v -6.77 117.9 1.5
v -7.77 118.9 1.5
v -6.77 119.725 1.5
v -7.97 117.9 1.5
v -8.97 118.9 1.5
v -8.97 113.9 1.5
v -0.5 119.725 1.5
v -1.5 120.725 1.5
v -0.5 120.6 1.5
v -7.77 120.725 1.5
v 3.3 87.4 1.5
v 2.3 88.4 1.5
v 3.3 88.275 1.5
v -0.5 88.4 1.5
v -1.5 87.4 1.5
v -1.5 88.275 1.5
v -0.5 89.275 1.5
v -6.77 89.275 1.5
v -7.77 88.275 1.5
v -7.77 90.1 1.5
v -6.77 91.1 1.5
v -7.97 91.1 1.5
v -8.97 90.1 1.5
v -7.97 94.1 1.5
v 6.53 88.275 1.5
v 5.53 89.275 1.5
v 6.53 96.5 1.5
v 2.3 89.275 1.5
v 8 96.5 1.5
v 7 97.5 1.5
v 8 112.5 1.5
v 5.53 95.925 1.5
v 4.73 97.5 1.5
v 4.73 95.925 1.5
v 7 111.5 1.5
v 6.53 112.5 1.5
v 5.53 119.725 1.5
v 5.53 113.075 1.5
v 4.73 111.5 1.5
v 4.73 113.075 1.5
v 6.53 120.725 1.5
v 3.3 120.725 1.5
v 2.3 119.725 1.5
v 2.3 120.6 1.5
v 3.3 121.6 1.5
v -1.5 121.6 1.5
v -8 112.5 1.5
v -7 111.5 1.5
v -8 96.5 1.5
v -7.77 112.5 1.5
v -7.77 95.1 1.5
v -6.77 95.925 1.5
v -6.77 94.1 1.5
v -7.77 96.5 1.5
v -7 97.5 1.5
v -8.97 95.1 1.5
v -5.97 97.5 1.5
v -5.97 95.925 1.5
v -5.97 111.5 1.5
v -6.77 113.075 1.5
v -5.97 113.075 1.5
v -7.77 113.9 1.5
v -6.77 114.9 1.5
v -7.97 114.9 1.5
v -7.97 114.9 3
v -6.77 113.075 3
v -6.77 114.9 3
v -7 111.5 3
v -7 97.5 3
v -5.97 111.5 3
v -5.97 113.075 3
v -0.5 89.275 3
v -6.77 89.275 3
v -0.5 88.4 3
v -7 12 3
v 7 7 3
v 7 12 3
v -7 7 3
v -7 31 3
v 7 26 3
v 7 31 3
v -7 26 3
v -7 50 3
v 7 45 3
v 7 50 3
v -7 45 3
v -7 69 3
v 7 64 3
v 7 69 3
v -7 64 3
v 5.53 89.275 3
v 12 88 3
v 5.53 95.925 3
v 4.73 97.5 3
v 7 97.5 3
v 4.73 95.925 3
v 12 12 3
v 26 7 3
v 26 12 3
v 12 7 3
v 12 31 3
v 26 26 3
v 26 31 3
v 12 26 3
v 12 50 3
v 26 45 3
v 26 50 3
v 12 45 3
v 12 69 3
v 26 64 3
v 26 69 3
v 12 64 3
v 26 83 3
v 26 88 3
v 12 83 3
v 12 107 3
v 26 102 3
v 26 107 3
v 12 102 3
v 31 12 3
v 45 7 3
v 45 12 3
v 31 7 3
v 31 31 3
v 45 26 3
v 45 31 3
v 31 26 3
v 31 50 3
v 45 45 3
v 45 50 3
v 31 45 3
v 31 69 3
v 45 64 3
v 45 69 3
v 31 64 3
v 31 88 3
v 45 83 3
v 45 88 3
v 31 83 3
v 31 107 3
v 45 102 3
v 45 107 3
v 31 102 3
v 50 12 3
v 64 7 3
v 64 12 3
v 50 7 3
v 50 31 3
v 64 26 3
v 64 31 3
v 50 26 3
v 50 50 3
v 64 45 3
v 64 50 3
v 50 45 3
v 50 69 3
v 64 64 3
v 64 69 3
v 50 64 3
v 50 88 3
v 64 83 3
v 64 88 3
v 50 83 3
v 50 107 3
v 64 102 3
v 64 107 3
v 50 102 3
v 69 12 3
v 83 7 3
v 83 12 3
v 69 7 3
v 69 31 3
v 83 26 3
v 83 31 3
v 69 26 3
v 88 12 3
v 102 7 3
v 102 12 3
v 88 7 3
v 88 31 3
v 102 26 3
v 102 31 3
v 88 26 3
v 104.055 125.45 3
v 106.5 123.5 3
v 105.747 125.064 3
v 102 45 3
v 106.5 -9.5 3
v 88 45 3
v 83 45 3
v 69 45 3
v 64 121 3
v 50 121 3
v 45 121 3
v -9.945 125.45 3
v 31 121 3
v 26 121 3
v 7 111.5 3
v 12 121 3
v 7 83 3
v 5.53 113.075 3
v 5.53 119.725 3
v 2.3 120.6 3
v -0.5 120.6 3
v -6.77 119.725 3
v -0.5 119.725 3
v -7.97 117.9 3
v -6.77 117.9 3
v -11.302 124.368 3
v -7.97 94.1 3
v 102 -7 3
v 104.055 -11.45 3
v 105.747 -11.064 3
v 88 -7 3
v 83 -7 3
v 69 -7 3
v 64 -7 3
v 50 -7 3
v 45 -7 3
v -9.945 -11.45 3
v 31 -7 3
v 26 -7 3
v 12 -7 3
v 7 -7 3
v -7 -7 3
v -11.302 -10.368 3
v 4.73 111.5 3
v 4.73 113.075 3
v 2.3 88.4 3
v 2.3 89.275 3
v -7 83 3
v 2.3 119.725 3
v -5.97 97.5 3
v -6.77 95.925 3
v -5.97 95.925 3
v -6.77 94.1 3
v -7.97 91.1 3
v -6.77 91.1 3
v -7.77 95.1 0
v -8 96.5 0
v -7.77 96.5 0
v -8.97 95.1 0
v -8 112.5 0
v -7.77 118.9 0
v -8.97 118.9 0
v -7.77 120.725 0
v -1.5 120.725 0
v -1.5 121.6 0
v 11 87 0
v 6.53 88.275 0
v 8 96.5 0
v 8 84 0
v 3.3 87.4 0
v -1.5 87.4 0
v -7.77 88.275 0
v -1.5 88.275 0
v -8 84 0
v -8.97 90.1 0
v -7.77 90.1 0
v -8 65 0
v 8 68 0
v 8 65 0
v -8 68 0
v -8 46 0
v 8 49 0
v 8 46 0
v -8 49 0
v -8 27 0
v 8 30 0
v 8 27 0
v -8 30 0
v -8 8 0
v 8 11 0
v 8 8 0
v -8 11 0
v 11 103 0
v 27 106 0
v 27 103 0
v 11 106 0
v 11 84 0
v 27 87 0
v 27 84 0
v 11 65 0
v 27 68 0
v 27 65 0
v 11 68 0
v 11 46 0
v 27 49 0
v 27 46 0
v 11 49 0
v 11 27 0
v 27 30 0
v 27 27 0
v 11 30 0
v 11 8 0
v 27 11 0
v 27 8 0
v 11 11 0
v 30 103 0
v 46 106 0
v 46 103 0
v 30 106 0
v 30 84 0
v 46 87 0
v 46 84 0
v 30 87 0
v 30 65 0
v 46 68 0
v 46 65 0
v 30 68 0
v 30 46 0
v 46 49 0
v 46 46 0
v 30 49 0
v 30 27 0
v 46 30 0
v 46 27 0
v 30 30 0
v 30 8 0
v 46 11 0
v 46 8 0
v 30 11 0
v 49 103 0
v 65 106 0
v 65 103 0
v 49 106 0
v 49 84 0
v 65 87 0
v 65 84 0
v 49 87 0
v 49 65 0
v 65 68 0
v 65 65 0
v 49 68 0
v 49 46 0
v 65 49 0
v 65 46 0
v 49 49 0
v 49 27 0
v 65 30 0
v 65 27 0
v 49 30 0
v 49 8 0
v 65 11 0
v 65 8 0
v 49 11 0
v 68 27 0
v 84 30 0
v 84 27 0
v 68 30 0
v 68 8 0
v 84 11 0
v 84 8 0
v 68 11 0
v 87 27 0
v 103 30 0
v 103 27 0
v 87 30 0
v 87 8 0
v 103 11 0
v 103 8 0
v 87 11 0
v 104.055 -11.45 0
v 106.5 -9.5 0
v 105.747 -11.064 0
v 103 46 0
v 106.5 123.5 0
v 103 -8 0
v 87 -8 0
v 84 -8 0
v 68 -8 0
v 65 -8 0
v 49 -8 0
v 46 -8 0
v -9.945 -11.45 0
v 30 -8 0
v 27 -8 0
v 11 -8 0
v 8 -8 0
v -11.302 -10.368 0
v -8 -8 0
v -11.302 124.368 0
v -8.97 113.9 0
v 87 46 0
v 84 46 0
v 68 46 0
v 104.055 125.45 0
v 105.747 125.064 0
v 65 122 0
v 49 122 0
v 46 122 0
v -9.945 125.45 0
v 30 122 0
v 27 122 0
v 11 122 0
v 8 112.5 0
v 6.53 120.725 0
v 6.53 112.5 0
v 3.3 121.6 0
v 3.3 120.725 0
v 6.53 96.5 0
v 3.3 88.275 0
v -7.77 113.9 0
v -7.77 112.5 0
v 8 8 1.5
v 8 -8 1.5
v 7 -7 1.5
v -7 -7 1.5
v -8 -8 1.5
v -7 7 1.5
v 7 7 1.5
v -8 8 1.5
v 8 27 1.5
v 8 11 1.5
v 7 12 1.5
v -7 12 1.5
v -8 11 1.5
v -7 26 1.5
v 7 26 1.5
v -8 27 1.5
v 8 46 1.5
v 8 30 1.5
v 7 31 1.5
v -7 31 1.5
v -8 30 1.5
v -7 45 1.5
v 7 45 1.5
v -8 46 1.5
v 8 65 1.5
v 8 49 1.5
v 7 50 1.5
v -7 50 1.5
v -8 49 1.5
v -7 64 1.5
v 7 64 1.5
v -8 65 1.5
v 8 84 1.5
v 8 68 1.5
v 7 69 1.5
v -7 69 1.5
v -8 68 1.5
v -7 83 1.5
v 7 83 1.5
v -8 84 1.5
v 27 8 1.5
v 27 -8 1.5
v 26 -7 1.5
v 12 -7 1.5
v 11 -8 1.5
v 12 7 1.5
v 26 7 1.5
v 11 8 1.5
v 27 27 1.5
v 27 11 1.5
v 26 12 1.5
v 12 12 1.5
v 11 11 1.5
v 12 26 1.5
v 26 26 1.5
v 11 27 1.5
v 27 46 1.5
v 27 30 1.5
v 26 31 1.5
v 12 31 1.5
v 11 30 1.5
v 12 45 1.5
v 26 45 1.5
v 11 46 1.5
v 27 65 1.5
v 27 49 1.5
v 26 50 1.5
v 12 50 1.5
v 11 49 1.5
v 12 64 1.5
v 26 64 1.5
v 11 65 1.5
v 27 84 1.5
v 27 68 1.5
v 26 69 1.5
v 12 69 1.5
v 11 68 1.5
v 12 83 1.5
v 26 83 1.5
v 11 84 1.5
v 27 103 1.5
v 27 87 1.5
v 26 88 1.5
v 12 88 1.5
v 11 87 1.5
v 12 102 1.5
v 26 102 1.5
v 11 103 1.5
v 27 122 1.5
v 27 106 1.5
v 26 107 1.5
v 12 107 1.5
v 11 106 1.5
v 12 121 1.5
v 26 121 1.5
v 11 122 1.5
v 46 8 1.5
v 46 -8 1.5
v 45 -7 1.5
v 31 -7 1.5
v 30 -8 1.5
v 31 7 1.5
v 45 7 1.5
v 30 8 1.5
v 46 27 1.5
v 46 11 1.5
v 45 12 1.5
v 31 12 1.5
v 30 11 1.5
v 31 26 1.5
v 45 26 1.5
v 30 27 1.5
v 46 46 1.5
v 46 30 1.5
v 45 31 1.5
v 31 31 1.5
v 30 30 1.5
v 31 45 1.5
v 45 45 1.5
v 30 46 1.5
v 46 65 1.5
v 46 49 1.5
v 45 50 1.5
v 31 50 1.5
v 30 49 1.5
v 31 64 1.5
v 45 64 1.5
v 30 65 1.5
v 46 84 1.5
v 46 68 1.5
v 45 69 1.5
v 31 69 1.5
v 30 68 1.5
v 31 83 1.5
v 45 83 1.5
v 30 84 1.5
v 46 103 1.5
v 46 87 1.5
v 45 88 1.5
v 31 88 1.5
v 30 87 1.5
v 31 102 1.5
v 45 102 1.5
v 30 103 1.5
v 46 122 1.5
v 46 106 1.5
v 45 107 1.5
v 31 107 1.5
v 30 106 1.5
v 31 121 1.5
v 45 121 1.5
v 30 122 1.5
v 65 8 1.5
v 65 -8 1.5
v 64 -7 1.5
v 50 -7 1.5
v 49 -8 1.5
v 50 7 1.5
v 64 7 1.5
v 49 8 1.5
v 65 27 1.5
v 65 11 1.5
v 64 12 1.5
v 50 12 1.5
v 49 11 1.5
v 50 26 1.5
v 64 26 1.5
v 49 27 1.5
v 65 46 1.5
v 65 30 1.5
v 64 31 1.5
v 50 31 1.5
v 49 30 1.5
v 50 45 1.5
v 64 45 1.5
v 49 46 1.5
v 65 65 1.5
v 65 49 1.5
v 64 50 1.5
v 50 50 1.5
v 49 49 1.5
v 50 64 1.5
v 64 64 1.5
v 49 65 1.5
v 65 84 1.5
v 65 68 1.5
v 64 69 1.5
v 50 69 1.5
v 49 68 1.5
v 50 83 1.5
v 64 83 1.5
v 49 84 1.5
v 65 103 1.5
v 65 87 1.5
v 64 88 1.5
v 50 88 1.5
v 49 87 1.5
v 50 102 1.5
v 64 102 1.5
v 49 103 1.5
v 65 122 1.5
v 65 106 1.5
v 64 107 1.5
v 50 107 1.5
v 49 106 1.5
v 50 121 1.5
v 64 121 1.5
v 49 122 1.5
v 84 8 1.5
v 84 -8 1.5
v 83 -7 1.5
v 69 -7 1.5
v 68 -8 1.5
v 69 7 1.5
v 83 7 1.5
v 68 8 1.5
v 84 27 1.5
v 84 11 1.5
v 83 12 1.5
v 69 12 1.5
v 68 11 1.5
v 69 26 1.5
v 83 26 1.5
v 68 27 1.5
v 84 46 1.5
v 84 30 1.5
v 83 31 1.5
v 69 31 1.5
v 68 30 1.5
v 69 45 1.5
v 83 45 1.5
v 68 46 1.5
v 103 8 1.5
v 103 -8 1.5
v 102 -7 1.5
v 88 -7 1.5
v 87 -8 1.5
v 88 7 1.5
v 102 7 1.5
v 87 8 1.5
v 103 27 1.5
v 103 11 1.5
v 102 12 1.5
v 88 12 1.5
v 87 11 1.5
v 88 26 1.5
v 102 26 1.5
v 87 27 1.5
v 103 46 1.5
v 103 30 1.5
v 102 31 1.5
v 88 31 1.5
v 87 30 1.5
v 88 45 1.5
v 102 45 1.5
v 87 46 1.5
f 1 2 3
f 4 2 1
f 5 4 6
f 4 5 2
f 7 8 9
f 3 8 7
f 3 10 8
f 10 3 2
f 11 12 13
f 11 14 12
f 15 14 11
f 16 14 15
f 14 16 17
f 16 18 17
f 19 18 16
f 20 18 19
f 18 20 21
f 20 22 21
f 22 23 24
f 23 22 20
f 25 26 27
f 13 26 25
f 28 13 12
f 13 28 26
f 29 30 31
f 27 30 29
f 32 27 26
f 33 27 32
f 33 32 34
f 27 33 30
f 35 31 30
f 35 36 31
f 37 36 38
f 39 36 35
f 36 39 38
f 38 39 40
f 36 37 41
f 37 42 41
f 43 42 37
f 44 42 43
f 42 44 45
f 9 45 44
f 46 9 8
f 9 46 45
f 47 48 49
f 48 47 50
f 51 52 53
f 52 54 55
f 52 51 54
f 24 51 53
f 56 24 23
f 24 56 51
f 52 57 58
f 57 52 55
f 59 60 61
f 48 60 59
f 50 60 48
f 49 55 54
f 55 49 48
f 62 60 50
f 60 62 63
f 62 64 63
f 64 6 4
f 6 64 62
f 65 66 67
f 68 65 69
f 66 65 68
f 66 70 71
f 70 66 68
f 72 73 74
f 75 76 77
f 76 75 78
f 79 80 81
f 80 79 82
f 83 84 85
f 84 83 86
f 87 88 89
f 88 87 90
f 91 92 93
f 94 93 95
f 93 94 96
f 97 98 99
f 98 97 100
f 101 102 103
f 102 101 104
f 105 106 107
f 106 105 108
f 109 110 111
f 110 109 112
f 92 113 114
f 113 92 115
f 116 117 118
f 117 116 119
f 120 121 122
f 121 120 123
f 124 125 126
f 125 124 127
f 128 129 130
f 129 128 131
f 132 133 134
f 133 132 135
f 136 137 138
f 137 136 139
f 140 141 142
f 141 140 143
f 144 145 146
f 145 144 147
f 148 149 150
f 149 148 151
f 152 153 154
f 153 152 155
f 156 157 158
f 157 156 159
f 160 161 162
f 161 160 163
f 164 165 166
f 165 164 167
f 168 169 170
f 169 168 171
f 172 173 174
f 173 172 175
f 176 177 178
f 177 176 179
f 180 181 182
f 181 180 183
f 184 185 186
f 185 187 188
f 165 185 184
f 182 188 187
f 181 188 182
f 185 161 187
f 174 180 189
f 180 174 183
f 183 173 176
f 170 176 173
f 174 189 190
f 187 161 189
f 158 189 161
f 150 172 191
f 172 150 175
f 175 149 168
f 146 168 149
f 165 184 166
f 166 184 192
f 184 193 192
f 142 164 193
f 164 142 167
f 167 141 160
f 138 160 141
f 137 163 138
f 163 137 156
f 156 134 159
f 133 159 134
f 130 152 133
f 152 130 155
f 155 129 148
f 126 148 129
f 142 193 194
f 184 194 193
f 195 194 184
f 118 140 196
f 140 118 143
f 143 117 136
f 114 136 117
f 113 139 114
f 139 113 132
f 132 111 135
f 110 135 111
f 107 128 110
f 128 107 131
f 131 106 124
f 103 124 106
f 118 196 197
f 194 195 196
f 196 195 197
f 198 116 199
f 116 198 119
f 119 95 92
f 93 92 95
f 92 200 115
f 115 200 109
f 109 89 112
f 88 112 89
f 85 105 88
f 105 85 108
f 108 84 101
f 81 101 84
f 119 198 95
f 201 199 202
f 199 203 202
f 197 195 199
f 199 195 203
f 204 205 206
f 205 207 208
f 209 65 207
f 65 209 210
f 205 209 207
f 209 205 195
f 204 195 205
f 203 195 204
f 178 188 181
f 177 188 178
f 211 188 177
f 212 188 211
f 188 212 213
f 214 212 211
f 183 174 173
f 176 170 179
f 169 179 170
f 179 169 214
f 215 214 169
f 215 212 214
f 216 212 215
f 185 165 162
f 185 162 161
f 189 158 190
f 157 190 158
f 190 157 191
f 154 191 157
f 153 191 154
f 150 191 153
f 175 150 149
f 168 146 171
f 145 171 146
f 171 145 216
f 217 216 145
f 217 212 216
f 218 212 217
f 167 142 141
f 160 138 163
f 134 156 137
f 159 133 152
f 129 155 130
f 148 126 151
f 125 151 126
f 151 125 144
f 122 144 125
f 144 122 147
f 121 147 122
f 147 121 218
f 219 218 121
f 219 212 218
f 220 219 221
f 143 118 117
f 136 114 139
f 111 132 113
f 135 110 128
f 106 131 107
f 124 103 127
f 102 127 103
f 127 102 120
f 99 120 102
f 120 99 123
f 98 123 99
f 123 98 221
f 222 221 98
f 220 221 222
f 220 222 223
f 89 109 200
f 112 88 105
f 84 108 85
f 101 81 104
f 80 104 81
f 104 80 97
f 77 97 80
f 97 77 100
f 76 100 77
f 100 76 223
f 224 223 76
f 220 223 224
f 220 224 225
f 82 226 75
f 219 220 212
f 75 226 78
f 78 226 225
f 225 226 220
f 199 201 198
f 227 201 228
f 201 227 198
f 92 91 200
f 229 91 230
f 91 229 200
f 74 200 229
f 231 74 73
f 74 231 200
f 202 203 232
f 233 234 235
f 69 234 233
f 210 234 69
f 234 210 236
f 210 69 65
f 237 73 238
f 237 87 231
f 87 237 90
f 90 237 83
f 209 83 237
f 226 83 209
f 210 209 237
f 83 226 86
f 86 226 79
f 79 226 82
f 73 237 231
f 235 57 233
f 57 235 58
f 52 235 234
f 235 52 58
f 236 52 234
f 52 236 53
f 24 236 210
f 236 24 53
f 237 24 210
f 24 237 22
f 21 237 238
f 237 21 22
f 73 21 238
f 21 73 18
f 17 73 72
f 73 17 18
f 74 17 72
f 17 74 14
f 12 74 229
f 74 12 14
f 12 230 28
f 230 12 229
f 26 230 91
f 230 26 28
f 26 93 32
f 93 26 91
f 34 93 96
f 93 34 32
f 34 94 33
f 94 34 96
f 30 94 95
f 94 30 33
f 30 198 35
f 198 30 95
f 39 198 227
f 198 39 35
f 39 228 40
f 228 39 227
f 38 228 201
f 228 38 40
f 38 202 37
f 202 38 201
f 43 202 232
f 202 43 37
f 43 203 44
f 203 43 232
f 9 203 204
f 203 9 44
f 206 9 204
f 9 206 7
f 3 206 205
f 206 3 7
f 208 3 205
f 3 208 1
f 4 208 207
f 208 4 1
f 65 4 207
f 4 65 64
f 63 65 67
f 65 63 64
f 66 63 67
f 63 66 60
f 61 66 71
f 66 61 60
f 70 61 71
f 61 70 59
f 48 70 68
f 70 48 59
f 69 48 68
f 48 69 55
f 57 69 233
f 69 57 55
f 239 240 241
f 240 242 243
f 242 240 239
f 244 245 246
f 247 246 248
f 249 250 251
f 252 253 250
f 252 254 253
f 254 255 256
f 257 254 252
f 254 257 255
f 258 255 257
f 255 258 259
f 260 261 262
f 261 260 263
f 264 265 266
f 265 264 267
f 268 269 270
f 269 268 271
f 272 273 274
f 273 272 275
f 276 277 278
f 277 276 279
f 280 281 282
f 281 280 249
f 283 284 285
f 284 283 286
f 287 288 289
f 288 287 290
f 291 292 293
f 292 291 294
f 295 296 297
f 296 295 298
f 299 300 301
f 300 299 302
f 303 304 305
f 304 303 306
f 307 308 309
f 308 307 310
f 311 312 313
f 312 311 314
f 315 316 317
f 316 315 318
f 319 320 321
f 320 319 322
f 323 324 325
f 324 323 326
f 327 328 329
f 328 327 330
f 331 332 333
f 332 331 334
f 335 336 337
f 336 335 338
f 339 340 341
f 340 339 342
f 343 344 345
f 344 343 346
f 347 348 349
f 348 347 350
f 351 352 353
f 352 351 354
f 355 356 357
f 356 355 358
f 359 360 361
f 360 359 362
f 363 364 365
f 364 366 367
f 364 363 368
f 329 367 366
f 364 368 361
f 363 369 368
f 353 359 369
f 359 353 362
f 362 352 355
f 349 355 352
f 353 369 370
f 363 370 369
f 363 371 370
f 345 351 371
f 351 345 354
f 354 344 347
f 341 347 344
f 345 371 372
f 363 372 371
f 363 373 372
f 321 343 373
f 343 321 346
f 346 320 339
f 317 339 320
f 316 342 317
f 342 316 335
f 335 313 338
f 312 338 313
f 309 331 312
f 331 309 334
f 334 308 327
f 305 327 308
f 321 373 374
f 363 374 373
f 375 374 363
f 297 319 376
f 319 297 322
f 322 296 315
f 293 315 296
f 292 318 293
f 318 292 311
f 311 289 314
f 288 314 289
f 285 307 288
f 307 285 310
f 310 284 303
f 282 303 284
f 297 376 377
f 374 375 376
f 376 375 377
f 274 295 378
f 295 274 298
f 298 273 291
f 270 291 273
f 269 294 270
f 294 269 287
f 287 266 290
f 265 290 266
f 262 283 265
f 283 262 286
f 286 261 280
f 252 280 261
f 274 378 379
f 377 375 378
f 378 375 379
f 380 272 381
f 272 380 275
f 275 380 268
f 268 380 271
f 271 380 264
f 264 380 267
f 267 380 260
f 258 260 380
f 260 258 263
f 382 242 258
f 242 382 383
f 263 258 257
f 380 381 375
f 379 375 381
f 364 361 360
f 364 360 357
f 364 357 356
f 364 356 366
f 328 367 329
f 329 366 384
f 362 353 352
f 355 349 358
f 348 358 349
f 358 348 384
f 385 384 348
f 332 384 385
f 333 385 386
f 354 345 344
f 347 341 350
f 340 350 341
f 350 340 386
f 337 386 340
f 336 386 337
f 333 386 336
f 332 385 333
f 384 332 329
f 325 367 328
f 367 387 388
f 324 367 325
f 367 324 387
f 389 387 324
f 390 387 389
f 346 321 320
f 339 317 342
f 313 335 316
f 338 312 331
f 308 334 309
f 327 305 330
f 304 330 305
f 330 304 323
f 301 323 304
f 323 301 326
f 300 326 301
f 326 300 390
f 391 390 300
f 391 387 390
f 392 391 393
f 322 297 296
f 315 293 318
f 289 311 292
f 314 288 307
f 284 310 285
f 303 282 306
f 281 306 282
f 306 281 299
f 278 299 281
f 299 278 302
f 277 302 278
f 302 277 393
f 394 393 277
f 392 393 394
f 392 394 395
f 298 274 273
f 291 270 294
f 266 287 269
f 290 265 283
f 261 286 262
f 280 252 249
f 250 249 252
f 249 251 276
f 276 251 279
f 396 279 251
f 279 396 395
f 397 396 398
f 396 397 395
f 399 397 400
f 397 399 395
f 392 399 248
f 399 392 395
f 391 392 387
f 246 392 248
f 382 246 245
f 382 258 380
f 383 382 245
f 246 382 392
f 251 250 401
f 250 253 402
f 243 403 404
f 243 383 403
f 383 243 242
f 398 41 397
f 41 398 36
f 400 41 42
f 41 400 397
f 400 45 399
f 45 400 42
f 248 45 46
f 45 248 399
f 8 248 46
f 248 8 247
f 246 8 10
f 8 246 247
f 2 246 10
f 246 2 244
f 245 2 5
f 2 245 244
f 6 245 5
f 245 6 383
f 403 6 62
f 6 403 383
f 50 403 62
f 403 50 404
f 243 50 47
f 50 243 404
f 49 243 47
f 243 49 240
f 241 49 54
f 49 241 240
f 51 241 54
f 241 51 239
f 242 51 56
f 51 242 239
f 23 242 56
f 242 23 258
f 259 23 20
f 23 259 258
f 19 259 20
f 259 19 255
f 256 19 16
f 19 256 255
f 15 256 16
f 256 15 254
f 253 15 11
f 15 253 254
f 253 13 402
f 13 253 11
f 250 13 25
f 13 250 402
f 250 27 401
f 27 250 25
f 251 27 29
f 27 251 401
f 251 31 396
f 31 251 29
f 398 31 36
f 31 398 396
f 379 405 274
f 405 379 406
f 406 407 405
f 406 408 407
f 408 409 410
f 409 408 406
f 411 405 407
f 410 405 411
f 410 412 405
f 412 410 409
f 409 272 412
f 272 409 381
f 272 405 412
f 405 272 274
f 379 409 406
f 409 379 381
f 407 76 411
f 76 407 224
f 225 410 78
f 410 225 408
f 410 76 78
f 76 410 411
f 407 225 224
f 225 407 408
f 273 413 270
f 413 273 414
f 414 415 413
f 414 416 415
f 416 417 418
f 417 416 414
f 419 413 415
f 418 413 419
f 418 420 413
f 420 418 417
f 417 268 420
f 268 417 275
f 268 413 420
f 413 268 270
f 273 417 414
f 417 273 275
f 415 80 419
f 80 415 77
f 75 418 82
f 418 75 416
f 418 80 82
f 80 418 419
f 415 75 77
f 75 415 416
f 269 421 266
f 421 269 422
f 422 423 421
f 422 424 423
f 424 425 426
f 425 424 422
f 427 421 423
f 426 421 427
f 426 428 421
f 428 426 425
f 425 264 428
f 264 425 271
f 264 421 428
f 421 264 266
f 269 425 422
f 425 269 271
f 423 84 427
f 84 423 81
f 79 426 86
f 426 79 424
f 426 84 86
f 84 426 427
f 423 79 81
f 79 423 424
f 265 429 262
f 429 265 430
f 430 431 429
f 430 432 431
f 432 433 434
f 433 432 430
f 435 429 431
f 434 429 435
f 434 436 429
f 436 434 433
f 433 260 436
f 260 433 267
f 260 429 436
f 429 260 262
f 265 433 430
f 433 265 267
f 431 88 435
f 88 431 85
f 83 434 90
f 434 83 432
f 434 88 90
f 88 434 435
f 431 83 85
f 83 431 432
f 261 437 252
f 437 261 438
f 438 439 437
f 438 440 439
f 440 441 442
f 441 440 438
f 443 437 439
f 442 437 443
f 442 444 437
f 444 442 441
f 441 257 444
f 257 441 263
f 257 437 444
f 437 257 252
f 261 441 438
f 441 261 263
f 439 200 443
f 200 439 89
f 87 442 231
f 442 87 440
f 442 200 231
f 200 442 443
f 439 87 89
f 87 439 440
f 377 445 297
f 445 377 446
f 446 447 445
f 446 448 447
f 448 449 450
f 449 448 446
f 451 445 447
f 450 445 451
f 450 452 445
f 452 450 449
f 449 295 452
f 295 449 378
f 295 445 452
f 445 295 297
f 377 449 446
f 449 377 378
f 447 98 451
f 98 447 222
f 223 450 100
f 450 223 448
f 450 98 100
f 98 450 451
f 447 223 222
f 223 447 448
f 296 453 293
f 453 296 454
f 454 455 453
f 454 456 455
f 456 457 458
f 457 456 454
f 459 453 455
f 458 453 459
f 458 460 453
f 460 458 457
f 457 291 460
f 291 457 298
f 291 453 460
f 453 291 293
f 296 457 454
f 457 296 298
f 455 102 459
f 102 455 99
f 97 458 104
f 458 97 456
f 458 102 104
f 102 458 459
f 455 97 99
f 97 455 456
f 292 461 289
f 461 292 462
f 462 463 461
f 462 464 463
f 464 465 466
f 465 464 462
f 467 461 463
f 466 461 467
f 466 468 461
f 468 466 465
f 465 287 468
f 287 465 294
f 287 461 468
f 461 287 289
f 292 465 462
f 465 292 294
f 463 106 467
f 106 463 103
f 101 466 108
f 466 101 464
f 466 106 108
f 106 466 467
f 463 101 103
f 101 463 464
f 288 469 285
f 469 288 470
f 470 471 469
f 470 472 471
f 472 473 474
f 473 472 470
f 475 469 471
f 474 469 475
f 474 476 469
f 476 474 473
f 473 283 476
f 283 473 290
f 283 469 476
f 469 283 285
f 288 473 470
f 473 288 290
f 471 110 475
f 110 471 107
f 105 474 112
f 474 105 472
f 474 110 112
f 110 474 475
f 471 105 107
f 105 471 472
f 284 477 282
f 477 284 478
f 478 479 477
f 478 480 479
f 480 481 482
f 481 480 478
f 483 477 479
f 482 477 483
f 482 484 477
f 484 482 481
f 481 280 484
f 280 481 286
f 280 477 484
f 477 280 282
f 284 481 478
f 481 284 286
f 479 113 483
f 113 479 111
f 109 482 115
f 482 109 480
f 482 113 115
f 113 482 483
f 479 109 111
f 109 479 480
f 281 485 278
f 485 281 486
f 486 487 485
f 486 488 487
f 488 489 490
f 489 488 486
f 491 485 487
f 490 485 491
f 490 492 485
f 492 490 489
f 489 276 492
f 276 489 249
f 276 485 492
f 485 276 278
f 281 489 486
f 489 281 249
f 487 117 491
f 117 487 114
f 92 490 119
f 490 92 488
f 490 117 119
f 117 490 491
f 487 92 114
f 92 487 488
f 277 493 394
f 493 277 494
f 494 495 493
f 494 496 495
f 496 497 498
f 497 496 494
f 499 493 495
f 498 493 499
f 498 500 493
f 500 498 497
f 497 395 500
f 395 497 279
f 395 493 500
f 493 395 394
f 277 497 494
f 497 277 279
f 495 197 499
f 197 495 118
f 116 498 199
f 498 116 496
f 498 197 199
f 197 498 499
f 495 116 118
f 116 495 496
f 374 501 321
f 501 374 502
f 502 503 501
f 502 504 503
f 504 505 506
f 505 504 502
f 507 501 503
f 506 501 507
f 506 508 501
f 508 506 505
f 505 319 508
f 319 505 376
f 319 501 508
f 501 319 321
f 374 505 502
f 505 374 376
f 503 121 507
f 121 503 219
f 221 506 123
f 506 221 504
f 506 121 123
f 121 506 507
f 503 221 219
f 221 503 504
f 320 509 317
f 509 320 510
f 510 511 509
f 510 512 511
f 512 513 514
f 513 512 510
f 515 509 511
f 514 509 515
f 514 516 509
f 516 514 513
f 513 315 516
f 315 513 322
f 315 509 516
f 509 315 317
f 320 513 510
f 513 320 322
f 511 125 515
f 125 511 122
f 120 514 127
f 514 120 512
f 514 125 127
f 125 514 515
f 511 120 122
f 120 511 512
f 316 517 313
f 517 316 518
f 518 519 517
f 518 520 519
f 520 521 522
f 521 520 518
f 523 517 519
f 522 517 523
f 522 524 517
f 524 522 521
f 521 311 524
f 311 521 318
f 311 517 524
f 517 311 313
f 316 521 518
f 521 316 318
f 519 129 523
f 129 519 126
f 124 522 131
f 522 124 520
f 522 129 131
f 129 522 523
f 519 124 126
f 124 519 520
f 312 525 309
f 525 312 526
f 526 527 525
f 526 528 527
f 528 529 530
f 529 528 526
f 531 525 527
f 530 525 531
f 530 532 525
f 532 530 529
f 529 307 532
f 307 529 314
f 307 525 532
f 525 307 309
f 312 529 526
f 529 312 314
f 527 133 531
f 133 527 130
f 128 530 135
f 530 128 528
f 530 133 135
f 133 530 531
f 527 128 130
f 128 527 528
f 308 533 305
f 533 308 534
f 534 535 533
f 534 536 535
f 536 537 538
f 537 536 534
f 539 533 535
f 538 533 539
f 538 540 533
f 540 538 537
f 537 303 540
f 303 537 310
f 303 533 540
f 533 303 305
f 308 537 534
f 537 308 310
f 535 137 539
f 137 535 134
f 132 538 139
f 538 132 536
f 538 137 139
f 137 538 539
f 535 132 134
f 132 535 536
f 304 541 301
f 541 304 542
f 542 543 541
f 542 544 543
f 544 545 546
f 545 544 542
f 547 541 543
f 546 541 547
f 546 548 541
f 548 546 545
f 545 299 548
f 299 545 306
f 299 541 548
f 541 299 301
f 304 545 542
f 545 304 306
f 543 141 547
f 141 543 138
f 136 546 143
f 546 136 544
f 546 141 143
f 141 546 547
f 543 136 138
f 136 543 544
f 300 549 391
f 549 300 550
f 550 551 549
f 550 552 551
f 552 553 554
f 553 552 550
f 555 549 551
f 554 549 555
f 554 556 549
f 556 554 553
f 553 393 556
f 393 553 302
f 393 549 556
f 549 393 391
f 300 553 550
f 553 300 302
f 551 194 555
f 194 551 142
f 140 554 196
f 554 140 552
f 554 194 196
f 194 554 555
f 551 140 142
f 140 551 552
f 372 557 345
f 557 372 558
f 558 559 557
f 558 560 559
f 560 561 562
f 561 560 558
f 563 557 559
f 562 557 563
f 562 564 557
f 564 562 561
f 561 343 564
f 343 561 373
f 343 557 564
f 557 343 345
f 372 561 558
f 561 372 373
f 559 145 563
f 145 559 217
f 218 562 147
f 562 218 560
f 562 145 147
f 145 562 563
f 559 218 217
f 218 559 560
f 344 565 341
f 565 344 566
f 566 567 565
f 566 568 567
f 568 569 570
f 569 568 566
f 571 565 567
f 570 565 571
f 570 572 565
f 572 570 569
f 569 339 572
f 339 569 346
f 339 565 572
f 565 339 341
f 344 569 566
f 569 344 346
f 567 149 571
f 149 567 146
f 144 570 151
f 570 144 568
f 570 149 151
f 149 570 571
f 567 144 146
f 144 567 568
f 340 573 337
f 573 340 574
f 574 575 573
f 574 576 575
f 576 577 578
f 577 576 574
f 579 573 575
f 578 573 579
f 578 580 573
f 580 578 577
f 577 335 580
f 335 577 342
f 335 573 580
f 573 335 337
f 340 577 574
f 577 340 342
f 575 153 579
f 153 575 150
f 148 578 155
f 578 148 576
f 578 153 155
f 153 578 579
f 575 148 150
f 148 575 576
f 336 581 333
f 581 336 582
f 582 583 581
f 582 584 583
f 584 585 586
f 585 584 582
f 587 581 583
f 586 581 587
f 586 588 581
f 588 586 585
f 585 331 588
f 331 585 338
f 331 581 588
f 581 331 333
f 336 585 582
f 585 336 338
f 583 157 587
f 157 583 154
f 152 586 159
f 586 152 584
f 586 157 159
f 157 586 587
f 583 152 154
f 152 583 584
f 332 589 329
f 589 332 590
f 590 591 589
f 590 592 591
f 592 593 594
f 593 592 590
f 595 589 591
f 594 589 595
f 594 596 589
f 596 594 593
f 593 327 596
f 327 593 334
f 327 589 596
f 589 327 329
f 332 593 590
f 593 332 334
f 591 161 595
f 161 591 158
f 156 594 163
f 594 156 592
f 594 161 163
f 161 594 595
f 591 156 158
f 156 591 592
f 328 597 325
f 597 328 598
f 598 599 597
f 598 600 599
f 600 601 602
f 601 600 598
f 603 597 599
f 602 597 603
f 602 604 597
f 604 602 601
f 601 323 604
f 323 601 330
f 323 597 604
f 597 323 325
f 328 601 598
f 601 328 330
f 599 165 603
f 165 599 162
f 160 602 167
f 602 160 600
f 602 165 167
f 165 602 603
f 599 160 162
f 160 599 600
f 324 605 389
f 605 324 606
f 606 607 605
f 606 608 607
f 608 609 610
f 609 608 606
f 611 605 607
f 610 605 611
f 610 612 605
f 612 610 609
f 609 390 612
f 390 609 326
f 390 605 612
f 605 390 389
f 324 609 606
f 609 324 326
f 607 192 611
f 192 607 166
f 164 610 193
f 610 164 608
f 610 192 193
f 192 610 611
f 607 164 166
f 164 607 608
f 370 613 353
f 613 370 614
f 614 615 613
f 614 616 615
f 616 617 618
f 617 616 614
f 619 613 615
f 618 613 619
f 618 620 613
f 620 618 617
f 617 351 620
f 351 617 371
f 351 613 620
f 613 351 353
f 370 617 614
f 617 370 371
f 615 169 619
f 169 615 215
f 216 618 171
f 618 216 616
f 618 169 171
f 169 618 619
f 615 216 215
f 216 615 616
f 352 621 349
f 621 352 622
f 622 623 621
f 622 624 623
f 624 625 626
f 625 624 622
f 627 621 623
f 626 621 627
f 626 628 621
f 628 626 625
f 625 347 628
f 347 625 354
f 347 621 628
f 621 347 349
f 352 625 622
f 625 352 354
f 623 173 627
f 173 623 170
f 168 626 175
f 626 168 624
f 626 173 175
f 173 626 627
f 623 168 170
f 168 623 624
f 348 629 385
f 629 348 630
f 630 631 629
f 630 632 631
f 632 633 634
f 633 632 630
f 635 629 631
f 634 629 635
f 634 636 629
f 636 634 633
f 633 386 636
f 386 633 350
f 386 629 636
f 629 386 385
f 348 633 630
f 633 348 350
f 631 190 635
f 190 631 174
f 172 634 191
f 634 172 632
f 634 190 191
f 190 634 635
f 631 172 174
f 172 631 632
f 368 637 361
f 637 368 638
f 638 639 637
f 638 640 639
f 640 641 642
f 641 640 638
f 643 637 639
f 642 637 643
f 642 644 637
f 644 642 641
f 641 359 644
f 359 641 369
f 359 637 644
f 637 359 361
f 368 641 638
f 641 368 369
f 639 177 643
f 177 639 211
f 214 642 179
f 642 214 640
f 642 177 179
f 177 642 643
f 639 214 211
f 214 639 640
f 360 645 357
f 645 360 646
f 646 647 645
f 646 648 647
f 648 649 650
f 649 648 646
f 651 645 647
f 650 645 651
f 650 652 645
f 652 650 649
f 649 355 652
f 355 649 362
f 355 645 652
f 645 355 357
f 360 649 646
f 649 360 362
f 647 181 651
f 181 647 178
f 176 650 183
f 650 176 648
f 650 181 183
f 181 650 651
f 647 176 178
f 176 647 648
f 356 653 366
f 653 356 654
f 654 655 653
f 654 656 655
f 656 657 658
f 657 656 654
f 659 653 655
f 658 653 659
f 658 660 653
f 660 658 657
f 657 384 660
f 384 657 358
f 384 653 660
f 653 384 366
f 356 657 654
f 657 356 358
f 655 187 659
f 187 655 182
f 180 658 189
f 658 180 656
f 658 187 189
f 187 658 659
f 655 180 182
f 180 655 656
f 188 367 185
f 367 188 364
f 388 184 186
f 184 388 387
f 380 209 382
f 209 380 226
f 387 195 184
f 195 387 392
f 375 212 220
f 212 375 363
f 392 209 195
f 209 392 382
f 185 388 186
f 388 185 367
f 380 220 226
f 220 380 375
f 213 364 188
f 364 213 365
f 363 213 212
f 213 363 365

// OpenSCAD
slop = 0.0;
switch_x = 14 + slop;
switch_y = switch_x;
rounding = 2;

plate_thickness = 3;

//clip_thickness = 1.524 + slop; //mx
clip_thickness = 1.5 + slop; //gateron

outer_padding = 5;
hole_size = 4;

case_height=12;

pitch = 19;
u = pitch;

switch_positions = [
                    //row1
                    [0,0,0],
                    [0,1*u,0],
                    [0,2*u,0],
                    [0,3*u,0],
                    [0,4*u,0],
                    //stab

                    //row2
                    [1*u,0,0],
                    [1*u,1*u,0],
                    [1*u,2*u,0],
                    [1*u,3*u,0],
                    [1*u,4*u,0],
                    [1*u,5*u,0],
                    [1*u,6*u,0],

                    //row3
                    [2*u,0,0],
                    [2*u,1*u,0],
                    [2*u,2*u,0],
                    [2*u,3*u,0],
                    [2*u,4*u,0],
                    [2*u,5*u,0],
                    [2*u,6*u,0],

                    //row4
                    [3*u,0,0],
                    [3*u,1*u,0],
                    [3*u,2*u,0],
                    [3*u,3*u,0],
                    [3*u,4*u,0],
                    [3*u,5*u,0],
                    [3*u,6*u,0],

                    //row5
                    [4*u,0,0],
                    [4*u,1*u,0],
                    [4*u,2*u,0],

                    //row6
                    [5*u,0,0],
                    [5*u,1*u,0],
                    [5*u,2*u,0],

                    ];

2u_stabilised_switch_positions = [
                    [0*u,5.5*u,0]
                    ];

module switch_hole(position){
    translate(position)
    translate([0,0,(plate_thickness-clip_thickness)/2])
    union(){
        //clip
        cube([switch_x+2, switch_y+2, plate_thickness-clip_thickness],center=true);
        //rim
        translate([0,0,plate_thickness-clip_thickness])cube([switch_x, switch_y, clip_thickness],center=true);
    }
}

module 2u_stabilised_key_hole(position){
    points = [
        [-0.50,32.2/2],
        [2.3,32.2/2],
        [2.3,30.45/2],
        [5.53,30.45/2],
        [5.53,17.15/2],
        [4.73,17.15/2],
        [4.73,14/2],
        [7,14/2],
        [7,0],

        [-7,0],
        [-7,14/2],
        [-5.97,14/2],
        [-5.97,17.15/2],
        [-6.77,17.15/2],
        [-6.77,20.80/2],
        [-7.97,20.80/2],
        [-7.97,26.80/2],
        [-6.77,26.80/2],
        [-6.77,30.45/2],
        [-0.5,30.45/2]
    ];

    translate(position)
    union(){
        //clip
        translate([0,0,plate_thickness-(clip_thickness/2)])
        linear_extrude(clip_thickness,center=true)
        union(){
            rotate([180,0,0])polygon(points);
            polygon(points);
        }

        //rim
        translate([0,0,(plate_thickness-clip_thickness)/2])
        linear_extrude(plate_thickness-clip_thickness,center=true)
        union(){
            rotate([180,0,0])offset(delta=1){polygon(points);}
            offset(delta=1){polygon(points);}
        }
    }

}

module plate_gen(){
    points = [
        [-.5*u,-.5*u,0],
        [-.5*u,6.5*u,0],
        [5.5*u,6.5*u,0],
        [5.5*u,-.5*u,0],
        ];
    hull(){
    for(i=points){
        translate(i)cylinder(r1=rounding, r2=rounding, h=plate_thickness);
    }
    }
}
difference(){
    //plate
    plate_gen();
    // cutouts for switches and stabs
    union(){
        //stabs from position list
        for(i=2u_stabilised_switch_positions){
            2u_stabilised_key_hole(i);
        }

        for(i=switch_positions){
            switch_hole(i);
        }
    }
}
